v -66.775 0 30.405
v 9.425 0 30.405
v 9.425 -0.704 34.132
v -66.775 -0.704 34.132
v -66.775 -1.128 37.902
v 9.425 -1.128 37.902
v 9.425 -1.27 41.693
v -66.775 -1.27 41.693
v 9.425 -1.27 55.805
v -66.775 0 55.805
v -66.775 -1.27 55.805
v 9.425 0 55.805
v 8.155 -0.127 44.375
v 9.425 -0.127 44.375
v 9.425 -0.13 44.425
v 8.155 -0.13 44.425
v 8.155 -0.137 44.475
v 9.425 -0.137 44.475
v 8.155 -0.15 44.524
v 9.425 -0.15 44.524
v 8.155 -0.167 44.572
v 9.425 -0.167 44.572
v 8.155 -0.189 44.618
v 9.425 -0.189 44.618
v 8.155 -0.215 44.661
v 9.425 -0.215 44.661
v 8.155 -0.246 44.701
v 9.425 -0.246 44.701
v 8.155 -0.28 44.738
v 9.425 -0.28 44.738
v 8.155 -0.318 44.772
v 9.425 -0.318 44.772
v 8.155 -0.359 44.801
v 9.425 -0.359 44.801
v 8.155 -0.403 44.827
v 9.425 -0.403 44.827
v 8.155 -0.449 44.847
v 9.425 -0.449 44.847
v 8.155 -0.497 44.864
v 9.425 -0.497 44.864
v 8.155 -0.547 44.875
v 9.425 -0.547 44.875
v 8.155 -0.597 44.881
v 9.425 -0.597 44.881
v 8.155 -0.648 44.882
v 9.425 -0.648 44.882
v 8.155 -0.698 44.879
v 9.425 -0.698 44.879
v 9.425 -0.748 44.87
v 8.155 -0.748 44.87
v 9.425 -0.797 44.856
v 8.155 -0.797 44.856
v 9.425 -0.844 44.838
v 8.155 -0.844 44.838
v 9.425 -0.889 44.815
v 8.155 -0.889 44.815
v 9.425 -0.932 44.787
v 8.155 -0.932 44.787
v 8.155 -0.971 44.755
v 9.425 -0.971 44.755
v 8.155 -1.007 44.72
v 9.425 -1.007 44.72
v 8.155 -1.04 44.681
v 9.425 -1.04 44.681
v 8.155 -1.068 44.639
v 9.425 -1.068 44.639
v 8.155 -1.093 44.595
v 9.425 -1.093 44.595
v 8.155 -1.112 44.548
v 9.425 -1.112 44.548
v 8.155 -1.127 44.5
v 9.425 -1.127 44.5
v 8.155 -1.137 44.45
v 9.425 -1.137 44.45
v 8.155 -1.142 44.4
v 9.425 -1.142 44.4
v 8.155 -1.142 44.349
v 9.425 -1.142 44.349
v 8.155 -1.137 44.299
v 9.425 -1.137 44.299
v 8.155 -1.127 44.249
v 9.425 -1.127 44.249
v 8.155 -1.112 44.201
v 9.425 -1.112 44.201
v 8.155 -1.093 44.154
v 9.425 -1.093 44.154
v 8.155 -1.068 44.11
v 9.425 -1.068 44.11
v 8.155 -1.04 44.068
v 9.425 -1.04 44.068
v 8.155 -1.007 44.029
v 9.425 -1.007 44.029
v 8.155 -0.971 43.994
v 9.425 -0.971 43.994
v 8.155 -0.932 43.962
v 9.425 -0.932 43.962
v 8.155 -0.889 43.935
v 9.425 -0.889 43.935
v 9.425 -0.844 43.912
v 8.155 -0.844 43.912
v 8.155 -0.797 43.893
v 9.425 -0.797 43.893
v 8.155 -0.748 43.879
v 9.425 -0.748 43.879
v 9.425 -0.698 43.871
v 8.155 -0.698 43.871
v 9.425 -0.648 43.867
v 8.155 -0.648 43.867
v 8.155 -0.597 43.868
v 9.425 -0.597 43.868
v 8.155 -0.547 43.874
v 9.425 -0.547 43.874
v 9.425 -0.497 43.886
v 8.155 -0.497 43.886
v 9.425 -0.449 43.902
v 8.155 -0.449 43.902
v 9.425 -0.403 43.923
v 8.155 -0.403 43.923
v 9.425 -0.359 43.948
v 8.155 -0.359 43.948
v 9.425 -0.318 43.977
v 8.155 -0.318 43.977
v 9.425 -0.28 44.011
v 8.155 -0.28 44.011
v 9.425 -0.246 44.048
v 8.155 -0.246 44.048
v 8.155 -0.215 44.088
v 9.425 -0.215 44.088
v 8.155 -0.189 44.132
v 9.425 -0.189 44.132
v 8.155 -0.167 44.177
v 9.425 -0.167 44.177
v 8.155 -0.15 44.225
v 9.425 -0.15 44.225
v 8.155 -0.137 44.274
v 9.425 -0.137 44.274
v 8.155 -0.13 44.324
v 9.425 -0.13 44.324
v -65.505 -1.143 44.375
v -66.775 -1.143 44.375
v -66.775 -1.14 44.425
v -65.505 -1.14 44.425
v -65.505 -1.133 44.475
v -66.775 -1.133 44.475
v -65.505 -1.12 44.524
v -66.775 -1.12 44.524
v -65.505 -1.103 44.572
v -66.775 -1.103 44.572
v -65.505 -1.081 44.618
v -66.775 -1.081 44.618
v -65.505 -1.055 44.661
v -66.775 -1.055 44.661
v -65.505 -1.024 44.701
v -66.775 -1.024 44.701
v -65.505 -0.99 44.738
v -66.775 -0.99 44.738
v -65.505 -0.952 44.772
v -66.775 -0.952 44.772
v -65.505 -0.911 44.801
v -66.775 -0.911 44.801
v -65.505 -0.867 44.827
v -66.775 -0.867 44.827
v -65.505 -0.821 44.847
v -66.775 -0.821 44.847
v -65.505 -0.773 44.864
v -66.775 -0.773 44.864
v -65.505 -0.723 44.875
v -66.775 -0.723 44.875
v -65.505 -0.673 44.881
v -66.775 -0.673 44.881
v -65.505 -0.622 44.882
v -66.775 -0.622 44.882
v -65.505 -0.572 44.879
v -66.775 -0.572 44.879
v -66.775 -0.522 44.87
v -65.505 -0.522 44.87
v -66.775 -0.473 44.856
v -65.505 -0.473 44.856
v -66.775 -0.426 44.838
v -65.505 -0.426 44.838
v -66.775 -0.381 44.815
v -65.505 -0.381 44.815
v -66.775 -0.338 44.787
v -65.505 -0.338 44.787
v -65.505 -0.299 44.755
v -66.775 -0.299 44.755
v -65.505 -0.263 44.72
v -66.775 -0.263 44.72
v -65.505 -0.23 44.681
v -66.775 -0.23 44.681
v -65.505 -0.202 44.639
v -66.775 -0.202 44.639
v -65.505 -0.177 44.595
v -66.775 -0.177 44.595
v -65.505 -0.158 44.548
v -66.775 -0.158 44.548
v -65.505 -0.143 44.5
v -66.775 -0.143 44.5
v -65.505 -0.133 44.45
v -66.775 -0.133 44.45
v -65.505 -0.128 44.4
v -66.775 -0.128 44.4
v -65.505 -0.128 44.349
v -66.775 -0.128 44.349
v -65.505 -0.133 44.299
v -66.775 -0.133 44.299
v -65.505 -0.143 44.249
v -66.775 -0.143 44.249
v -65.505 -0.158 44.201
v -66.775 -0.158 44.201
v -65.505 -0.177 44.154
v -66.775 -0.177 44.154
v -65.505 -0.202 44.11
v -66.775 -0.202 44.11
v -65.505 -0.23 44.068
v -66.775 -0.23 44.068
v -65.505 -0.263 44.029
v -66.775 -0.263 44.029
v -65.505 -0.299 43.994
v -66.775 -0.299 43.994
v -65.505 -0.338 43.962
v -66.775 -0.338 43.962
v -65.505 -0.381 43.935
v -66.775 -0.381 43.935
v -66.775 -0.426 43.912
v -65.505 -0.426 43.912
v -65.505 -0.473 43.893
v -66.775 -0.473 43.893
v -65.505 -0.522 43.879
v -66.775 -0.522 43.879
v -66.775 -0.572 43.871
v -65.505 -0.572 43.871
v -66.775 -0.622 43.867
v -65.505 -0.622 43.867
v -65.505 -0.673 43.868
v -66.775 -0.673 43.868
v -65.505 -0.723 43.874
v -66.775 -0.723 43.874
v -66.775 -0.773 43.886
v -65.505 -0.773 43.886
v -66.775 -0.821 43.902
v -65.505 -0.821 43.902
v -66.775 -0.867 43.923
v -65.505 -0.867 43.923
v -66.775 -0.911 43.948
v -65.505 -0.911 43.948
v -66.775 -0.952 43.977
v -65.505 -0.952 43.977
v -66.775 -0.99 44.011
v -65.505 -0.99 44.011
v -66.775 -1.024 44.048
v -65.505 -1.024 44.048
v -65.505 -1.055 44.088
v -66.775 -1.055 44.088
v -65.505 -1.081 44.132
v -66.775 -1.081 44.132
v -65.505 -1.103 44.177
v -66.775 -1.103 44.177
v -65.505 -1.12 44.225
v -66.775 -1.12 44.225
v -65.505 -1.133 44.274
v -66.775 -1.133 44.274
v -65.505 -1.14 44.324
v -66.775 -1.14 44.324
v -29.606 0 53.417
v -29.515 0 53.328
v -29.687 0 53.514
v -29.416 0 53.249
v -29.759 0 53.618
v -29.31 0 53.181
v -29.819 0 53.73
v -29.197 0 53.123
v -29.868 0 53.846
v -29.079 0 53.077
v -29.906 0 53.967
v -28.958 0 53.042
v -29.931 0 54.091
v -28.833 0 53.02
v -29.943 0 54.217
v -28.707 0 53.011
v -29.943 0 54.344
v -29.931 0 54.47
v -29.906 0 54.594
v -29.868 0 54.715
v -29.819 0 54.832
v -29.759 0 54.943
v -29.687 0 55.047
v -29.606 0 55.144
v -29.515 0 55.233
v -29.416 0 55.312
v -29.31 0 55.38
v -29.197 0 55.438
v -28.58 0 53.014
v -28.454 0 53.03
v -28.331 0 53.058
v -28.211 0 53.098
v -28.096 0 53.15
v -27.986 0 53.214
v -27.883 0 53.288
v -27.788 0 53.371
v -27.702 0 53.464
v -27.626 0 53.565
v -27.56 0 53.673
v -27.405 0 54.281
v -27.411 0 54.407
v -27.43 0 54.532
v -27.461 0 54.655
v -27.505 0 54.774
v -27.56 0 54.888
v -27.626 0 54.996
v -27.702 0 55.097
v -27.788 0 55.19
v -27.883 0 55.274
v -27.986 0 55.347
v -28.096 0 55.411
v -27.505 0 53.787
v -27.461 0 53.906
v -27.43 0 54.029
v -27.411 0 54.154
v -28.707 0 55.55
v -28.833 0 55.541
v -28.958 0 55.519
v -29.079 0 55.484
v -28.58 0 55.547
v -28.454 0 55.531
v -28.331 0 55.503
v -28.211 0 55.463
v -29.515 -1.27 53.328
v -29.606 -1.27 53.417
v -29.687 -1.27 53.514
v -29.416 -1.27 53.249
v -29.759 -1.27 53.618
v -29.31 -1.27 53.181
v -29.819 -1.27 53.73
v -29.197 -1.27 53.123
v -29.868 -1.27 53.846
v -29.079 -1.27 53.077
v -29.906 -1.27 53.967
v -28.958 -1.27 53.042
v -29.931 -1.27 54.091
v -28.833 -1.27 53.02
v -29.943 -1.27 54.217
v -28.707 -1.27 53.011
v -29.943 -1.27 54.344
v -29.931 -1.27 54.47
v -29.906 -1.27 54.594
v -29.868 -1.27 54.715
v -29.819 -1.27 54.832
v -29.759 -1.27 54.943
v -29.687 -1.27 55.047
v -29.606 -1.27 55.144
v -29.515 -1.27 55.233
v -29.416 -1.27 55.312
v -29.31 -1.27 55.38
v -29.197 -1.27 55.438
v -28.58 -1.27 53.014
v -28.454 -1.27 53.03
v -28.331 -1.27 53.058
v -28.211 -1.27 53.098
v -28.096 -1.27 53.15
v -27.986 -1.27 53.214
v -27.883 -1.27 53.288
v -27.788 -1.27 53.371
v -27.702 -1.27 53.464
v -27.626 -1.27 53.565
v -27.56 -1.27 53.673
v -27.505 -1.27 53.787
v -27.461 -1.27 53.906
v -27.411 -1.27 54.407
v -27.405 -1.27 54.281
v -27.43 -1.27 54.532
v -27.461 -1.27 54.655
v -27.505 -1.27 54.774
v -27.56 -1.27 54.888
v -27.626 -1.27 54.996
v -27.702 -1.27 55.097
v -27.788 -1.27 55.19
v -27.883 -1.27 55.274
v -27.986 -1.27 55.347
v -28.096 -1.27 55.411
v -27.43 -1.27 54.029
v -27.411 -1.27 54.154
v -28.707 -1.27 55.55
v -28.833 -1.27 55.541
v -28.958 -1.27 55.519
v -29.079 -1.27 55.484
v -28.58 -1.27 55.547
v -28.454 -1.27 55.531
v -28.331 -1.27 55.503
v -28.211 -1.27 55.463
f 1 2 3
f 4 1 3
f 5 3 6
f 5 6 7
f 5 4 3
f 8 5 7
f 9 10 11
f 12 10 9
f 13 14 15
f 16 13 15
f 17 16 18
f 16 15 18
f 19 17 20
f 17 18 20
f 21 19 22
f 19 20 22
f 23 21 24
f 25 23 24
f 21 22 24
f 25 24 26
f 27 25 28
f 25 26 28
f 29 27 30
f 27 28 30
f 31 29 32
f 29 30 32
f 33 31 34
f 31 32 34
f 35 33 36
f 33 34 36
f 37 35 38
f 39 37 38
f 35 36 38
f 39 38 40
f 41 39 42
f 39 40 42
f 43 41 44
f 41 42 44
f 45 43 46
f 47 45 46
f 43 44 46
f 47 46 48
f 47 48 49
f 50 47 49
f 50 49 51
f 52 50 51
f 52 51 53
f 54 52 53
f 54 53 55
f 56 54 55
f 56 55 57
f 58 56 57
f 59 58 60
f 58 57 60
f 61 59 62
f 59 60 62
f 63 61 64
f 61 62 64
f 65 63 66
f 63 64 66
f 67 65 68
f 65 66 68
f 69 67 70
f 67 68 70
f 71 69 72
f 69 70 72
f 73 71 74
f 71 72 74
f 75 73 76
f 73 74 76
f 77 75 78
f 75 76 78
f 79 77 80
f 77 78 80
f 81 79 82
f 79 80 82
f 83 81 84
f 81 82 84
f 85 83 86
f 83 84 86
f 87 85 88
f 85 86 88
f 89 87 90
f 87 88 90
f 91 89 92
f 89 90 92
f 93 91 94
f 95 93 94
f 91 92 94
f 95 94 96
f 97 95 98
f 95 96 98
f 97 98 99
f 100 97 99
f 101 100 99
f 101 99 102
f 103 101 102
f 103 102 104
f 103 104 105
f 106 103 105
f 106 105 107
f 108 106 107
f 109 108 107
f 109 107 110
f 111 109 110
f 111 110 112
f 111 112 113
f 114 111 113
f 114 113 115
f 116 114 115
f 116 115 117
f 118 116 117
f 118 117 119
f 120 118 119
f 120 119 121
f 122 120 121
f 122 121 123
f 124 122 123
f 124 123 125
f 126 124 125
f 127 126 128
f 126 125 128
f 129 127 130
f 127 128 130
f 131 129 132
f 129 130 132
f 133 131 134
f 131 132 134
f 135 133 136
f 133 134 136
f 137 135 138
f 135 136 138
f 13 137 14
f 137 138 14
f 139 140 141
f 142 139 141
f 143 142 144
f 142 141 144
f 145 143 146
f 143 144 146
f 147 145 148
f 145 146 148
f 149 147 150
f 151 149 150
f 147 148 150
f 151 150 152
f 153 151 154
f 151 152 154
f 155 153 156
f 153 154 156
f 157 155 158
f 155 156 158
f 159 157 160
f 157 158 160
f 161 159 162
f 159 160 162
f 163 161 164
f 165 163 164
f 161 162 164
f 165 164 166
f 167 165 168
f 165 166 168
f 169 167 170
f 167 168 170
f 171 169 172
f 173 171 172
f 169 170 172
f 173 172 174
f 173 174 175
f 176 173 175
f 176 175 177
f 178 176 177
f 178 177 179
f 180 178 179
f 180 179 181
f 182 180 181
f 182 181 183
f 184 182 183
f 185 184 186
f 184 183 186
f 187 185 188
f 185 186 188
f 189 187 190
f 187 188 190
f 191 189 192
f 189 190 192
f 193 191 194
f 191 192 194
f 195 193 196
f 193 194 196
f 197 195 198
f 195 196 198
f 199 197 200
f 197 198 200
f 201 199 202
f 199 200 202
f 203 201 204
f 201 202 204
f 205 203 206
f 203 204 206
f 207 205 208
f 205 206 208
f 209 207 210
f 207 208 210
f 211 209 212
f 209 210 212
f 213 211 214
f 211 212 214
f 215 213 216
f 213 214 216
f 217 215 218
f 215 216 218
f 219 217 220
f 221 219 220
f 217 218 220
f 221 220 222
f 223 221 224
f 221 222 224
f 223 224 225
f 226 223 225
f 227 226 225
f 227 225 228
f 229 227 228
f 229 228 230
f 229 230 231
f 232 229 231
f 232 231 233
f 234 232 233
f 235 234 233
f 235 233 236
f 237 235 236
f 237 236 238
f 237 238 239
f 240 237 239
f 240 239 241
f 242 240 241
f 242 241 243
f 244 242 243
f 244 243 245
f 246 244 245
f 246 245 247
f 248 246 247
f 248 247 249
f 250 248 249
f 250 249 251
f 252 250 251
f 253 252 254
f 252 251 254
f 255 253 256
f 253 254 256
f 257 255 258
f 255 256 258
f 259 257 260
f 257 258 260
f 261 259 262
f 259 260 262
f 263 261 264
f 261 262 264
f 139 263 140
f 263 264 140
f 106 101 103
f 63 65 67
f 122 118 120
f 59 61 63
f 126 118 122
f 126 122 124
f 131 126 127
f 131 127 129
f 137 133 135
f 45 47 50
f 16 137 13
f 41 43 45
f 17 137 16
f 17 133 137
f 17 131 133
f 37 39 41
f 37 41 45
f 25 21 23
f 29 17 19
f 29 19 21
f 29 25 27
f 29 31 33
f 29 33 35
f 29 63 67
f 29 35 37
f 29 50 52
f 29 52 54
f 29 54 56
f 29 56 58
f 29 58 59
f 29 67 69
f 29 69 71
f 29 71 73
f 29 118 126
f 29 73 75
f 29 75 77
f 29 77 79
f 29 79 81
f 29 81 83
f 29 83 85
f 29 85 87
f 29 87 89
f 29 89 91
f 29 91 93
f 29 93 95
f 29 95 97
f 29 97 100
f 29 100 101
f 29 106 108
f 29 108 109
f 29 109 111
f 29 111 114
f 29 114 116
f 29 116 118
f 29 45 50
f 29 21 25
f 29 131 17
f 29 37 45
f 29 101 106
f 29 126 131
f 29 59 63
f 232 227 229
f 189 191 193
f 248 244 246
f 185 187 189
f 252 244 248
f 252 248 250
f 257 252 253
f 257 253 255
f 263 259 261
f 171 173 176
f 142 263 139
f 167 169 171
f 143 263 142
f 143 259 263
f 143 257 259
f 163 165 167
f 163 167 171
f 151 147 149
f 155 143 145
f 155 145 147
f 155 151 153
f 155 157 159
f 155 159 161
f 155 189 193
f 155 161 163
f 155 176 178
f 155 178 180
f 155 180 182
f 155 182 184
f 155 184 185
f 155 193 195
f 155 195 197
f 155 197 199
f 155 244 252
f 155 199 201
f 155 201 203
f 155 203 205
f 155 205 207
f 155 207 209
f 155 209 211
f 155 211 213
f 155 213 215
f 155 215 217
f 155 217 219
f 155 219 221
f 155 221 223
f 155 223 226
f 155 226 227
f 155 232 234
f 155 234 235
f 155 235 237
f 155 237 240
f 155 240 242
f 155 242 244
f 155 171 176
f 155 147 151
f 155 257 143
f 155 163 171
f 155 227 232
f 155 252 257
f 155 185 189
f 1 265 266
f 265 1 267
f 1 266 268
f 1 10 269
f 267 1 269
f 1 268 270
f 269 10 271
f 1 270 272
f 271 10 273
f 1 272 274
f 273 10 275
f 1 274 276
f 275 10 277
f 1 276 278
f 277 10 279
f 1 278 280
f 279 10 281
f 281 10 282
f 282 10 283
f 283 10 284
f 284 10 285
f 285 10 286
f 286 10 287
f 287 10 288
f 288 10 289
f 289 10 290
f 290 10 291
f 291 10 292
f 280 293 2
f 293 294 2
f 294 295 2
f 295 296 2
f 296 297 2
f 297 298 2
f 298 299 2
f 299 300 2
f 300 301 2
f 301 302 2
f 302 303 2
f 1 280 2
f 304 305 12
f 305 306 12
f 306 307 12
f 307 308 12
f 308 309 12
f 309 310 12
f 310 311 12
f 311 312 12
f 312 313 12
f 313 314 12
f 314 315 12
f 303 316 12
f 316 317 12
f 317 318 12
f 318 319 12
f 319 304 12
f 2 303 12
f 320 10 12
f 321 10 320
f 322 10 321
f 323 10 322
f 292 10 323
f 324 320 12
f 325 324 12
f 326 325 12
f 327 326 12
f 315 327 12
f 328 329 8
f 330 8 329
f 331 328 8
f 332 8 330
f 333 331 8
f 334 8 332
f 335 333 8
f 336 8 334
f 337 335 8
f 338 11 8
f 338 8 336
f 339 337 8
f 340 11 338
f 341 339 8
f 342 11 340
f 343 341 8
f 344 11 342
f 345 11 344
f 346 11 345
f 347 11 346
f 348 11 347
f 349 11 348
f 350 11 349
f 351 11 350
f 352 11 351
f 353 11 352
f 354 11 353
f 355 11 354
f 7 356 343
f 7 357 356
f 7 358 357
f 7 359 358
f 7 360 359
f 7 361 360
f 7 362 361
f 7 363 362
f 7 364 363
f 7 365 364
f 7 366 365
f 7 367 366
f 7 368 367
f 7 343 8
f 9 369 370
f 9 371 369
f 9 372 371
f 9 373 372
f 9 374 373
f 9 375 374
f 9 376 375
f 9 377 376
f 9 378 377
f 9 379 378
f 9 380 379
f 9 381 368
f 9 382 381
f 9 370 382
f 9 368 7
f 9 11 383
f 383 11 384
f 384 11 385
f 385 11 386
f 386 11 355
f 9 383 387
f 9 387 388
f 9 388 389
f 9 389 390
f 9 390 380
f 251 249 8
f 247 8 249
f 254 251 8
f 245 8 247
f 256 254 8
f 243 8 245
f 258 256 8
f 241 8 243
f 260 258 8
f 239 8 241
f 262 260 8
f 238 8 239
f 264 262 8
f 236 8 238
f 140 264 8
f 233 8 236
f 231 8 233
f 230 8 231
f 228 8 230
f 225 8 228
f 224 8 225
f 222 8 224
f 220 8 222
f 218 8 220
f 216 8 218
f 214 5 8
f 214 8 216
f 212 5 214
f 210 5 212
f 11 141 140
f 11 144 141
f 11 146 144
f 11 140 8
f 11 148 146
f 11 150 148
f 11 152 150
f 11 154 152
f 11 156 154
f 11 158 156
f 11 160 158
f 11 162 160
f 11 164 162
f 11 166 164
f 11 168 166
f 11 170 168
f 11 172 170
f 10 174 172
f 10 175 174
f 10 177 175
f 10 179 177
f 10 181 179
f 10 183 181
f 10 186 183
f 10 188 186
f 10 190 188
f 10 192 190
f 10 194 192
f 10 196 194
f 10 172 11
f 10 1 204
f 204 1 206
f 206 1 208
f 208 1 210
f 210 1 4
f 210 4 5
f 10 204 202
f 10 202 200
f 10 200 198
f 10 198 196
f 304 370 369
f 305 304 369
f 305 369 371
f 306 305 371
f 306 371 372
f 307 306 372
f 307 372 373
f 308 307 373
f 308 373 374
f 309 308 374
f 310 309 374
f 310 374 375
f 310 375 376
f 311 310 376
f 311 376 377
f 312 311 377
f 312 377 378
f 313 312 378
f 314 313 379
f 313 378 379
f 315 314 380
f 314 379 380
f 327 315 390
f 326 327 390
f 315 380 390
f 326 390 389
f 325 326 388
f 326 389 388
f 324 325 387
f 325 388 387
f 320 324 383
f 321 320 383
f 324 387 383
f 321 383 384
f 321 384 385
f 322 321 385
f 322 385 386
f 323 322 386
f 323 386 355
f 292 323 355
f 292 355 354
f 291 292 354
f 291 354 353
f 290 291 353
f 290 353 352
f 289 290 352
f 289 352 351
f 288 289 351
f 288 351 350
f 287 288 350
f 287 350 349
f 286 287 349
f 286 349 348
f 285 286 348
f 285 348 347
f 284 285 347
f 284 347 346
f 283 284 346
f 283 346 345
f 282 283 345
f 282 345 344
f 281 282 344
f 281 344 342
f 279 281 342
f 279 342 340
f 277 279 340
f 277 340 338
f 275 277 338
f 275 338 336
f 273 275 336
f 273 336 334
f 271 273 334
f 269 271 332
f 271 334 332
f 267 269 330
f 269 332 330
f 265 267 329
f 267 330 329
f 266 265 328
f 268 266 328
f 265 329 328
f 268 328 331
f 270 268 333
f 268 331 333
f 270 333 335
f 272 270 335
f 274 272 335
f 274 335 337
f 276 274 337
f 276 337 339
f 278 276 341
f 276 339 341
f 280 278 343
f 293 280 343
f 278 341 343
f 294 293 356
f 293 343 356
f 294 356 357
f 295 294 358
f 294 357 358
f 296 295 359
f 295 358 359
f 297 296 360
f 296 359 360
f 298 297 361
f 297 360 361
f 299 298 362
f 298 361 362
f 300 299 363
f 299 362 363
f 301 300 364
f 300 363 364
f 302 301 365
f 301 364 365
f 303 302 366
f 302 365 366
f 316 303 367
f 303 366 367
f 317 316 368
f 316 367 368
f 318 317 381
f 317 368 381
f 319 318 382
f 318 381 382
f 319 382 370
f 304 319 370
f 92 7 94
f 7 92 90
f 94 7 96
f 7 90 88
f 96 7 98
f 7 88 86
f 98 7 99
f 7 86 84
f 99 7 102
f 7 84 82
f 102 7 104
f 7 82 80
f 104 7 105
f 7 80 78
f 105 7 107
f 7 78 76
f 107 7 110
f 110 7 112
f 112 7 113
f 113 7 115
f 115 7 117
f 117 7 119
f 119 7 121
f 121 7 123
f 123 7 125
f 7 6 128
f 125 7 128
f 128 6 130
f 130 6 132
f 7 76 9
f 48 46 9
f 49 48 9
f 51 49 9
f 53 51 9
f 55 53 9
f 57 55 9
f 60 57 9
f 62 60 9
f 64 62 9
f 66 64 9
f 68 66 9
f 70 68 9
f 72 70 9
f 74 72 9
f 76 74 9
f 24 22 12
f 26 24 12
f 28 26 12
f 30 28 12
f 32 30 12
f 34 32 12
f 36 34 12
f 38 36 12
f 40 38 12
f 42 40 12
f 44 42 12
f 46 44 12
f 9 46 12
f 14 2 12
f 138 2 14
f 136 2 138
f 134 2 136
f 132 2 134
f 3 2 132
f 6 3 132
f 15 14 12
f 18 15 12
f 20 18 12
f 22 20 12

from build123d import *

# Parameters (mm, degrees)
F0_W        = 76.2
F0_H        = 25.4
F1_DEPTH    = 1.27
F2_T1_DEPTH = 132.64003455
F3_R        = 0.508
F4_DEPTH    = 1.27
F5_R        = 0.508
F6_DEPTH    = 1.27
F7_R        = 1.27
F8_DEPTH    = 25.4


# Not quite as in the source:
# - a fillet or chamfer that OpenCascade refuses, or shapes differently, is made with other operations: its cross-section is extruded or revolved along the edge and cut away or added


with BuildPart() as f1:
    # F0 (on Front) → F1 (new body)
    with BuildSketch(Plane.XZ):
        with Locations((-28.6749217987, 43.1045838744)):
            Rectangle(F0_W, F0_H)
    extrude(amount=F1_DEPTH)

    # F2: fillet of radius 50.8 on 1 edges, made by hand

    # F2_s2 → F2_t1 (cut)
    with BuildSketch(Plane.YZ.offset(-94.9949390737)):
        with BuildLine():
            ThreePointArc((0, 30.4045838744), (-0.9515015625, 36.0129781215), (-1.27, 41.6925907843))
            Line((-1.27, 41.6925907843), (-2.286, 41.6925907843))
            Line((-2.286, 41.6925907843), (-2.286, 30.4045838744))
            Line((-2.286, 30.4045838744), (-1.27, 29.3885838744))
            ThreePointArc((-1.27, 29.3885838744), (-0.635, 29.3885838744), (-0.9906, 30.1788237362))
            Line((-0.9906, 30.1788237362), (0, 30.4045838744))
        make_face()
    extrude(amount=F2_T1_DEPTH, mode=Mode.SUBTRACT)

    # F3 (on face) → F4 (cut)
    with BuildSketch(Plane(origin=(-66.7749217987, 0, 0), x_dir=(0, -1, 0), z_dir=(-1, 0, 0))):
        with Locations((0.635, 44.3745838744)):
            Circle(F3_R)
    extrude(amount=-F4_DEPTH, mode=Mode.SUBTRACT)

    # F5 (on face) → F6 (cut)
    with BuildSketch(Plane.YZ.offset(9.4250782013)):
        with Locations((-0.635, 44.3745838744)):
            Circle(F5_R)
    extrude(amount=-F6_DEPTH, mode=Mode.SUBTRACT)

    # F7 (on face) → F8 (cut)
    with BuildSketch(Plane.XZ.offset(1.27)):
        with Locations((-28.6749217987, 54.2805838744)):
            Circle(F7_R)
    extrude(amount=-F8_DEPTH, mode=Mode.SUBTRACT)


solid = f1.part
